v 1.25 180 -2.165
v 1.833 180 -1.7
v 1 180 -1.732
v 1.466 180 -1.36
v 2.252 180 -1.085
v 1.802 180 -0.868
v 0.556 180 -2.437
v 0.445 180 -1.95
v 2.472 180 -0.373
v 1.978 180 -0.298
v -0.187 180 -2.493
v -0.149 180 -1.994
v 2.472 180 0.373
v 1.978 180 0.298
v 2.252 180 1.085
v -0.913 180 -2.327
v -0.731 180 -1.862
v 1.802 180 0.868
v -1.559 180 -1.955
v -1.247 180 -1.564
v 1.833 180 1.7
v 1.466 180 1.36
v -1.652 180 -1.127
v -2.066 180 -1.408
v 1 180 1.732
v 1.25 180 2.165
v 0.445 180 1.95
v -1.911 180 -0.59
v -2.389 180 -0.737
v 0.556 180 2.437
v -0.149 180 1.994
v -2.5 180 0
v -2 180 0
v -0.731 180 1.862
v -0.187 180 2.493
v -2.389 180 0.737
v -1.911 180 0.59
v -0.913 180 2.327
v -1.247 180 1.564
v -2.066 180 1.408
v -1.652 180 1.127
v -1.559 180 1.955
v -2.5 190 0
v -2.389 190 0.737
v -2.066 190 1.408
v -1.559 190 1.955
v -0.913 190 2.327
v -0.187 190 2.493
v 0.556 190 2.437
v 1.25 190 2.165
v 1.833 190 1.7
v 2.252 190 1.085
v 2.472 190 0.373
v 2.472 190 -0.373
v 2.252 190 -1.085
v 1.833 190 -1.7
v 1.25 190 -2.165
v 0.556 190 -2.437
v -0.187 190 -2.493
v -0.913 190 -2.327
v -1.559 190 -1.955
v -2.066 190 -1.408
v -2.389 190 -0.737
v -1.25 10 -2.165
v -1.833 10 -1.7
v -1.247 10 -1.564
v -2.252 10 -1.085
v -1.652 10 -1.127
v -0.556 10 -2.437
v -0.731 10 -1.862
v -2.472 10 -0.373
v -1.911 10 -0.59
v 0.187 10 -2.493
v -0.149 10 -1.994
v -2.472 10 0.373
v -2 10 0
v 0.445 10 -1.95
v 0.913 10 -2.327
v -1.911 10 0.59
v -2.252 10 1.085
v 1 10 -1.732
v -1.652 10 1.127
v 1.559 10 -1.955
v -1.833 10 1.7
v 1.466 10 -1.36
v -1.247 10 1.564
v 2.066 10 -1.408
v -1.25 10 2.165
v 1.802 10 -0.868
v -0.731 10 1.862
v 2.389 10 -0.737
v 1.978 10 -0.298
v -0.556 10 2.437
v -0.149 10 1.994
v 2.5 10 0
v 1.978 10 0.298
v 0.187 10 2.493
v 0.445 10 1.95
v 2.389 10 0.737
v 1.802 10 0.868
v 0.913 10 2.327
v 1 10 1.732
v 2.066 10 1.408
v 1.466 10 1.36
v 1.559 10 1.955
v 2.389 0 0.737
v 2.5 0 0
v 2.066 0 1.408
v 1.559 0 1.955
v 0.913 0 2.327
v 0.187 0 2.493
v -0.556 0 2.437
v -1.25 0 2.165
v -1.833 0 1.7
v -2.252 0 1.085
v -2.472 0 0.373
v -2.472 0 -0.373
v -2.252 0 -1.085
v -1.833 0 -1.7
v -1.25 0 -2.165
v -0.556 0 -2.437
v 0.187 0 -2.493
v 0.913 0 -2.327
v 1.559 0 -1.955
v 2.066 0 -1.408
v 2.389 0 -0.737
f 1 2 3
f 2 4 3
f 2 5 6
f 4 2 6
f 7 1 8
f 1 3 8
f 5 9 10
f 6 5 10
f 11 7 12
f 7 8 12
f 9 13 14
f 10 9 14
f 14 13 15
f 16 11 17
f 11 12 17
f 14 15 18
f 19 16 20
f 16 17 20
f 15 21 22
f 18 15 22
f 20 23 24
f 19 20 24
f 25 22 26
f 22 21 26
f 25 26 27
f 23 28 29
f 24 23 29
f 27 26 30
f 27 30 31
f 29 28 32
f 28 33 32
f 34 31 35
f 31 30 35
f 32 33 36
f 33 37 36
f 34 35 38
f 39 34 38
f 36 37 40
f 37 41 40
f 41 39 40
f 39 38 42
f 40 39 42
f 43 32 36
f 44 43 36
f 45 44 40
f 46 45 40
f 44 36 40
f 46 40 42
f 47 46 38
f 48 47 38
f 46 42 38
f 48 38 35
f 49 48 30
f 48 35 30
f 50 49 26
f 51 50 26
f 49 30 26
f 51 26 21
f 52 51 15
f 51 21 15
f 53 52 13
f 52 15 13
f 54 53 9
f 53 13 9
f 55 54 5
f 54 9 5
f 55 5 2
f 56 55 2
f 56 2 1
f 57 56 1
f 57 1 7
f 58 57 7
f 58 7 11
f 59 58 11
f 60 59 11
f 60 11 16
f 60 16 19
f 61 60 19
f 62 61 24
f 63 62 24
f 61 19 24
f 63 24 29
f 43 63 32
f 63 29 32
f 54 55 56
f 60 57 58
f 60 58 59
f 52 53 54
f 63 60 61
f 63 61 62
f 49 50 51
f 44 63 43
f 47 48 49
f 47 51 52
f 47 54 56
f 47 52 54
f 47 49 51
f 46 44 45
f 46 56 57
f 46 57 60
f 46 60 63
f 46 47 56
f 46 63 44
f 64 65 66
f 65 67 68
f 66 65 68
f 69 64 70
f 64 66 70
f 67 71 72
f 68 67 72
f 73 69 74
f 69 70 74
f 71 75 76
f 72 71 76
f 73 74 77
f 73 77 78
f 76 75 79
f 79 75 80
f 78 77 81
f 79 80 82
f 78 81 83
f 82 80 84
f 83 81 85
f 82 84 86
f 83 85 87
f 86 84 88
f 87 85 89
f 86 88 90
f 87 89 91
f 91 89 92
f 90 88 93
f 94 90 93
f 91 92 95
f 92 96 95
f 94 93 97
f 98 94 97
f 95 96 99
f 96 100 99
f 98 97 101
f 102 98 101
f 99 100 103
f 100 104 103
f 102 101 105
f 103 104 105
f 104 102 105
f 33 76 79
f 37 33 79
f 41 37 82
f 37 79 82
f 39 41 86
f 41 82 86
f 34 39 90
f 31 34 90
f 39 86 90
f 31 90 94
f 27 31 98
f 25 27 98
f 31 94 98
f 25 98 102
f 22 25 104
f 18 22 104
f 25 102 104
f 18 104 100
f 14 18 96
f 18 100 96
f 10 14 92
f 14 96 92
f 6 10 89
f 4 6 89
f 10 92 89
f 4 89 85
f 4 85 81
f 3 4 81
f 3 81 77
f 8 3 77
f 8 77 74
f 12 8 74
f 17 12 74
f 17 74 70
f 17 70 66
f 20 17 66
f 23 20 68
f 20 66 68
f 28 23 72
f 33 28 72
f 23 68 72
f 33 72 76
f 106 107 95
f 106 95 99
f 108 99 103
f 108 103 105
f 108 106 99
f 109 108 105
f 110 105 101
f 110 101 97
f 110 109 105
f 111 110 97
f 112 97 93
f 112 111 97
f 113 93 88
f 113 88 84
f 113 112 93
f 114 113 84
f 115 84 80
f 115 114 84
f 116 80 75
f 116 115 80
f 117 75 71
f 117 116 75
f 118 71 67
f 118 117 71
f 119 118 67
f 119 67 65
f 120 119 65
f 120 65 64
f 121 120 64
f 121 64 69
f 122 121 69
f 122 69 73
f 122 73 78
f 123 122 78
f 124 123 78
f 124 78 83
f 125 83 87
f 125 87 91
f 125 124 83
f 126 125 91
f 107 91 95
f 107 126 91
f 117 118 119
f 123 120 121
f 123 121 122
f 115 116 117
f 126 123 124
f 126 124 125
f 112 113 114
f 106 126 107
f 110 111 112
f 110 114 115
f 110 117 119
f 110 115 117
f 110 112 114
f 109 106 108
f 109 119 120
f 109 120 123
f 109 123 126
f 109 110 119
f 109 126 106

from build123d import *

# Parameters (mm, degrees)
F0_R     = 2.5
F1_DEPTH = 10
F2_R     = 2
F3_DEPTH = 170
F4_R     = 2.5
F4_R_2   = 2
F5_DEPTH = 10


with BuildPart() as f1:
    # F0 (on Front) → F1 (new body)
    with BuildSketch(Plane.XZ):
        Circle(F0_R)
    extrude(amount=-F1_DEPTH)

    # F2 (on face) → F3 (join)
    with BuildSketch(Plane(origin=(0, 10, 0), x_dir=(-1, 0, 0), z_dir=(0, 1, 0))):
        Circle(F2_R)
    extrude(amount=F3_DEPTH)

    # F4 (on face) → F5 (join)
    with BuildSketch(Plane(origin=(0, 180, 0), x_dir=(-1, 0, 0), z_dir=(0, 1, 0))):
        Circle(F4_R)
        Circle(F4_R_2, mode=Mode.SUBTRACT)
        Circle(F4_R_2)
    extrude(amount=F5_DEPTH)


solid = f1.part
